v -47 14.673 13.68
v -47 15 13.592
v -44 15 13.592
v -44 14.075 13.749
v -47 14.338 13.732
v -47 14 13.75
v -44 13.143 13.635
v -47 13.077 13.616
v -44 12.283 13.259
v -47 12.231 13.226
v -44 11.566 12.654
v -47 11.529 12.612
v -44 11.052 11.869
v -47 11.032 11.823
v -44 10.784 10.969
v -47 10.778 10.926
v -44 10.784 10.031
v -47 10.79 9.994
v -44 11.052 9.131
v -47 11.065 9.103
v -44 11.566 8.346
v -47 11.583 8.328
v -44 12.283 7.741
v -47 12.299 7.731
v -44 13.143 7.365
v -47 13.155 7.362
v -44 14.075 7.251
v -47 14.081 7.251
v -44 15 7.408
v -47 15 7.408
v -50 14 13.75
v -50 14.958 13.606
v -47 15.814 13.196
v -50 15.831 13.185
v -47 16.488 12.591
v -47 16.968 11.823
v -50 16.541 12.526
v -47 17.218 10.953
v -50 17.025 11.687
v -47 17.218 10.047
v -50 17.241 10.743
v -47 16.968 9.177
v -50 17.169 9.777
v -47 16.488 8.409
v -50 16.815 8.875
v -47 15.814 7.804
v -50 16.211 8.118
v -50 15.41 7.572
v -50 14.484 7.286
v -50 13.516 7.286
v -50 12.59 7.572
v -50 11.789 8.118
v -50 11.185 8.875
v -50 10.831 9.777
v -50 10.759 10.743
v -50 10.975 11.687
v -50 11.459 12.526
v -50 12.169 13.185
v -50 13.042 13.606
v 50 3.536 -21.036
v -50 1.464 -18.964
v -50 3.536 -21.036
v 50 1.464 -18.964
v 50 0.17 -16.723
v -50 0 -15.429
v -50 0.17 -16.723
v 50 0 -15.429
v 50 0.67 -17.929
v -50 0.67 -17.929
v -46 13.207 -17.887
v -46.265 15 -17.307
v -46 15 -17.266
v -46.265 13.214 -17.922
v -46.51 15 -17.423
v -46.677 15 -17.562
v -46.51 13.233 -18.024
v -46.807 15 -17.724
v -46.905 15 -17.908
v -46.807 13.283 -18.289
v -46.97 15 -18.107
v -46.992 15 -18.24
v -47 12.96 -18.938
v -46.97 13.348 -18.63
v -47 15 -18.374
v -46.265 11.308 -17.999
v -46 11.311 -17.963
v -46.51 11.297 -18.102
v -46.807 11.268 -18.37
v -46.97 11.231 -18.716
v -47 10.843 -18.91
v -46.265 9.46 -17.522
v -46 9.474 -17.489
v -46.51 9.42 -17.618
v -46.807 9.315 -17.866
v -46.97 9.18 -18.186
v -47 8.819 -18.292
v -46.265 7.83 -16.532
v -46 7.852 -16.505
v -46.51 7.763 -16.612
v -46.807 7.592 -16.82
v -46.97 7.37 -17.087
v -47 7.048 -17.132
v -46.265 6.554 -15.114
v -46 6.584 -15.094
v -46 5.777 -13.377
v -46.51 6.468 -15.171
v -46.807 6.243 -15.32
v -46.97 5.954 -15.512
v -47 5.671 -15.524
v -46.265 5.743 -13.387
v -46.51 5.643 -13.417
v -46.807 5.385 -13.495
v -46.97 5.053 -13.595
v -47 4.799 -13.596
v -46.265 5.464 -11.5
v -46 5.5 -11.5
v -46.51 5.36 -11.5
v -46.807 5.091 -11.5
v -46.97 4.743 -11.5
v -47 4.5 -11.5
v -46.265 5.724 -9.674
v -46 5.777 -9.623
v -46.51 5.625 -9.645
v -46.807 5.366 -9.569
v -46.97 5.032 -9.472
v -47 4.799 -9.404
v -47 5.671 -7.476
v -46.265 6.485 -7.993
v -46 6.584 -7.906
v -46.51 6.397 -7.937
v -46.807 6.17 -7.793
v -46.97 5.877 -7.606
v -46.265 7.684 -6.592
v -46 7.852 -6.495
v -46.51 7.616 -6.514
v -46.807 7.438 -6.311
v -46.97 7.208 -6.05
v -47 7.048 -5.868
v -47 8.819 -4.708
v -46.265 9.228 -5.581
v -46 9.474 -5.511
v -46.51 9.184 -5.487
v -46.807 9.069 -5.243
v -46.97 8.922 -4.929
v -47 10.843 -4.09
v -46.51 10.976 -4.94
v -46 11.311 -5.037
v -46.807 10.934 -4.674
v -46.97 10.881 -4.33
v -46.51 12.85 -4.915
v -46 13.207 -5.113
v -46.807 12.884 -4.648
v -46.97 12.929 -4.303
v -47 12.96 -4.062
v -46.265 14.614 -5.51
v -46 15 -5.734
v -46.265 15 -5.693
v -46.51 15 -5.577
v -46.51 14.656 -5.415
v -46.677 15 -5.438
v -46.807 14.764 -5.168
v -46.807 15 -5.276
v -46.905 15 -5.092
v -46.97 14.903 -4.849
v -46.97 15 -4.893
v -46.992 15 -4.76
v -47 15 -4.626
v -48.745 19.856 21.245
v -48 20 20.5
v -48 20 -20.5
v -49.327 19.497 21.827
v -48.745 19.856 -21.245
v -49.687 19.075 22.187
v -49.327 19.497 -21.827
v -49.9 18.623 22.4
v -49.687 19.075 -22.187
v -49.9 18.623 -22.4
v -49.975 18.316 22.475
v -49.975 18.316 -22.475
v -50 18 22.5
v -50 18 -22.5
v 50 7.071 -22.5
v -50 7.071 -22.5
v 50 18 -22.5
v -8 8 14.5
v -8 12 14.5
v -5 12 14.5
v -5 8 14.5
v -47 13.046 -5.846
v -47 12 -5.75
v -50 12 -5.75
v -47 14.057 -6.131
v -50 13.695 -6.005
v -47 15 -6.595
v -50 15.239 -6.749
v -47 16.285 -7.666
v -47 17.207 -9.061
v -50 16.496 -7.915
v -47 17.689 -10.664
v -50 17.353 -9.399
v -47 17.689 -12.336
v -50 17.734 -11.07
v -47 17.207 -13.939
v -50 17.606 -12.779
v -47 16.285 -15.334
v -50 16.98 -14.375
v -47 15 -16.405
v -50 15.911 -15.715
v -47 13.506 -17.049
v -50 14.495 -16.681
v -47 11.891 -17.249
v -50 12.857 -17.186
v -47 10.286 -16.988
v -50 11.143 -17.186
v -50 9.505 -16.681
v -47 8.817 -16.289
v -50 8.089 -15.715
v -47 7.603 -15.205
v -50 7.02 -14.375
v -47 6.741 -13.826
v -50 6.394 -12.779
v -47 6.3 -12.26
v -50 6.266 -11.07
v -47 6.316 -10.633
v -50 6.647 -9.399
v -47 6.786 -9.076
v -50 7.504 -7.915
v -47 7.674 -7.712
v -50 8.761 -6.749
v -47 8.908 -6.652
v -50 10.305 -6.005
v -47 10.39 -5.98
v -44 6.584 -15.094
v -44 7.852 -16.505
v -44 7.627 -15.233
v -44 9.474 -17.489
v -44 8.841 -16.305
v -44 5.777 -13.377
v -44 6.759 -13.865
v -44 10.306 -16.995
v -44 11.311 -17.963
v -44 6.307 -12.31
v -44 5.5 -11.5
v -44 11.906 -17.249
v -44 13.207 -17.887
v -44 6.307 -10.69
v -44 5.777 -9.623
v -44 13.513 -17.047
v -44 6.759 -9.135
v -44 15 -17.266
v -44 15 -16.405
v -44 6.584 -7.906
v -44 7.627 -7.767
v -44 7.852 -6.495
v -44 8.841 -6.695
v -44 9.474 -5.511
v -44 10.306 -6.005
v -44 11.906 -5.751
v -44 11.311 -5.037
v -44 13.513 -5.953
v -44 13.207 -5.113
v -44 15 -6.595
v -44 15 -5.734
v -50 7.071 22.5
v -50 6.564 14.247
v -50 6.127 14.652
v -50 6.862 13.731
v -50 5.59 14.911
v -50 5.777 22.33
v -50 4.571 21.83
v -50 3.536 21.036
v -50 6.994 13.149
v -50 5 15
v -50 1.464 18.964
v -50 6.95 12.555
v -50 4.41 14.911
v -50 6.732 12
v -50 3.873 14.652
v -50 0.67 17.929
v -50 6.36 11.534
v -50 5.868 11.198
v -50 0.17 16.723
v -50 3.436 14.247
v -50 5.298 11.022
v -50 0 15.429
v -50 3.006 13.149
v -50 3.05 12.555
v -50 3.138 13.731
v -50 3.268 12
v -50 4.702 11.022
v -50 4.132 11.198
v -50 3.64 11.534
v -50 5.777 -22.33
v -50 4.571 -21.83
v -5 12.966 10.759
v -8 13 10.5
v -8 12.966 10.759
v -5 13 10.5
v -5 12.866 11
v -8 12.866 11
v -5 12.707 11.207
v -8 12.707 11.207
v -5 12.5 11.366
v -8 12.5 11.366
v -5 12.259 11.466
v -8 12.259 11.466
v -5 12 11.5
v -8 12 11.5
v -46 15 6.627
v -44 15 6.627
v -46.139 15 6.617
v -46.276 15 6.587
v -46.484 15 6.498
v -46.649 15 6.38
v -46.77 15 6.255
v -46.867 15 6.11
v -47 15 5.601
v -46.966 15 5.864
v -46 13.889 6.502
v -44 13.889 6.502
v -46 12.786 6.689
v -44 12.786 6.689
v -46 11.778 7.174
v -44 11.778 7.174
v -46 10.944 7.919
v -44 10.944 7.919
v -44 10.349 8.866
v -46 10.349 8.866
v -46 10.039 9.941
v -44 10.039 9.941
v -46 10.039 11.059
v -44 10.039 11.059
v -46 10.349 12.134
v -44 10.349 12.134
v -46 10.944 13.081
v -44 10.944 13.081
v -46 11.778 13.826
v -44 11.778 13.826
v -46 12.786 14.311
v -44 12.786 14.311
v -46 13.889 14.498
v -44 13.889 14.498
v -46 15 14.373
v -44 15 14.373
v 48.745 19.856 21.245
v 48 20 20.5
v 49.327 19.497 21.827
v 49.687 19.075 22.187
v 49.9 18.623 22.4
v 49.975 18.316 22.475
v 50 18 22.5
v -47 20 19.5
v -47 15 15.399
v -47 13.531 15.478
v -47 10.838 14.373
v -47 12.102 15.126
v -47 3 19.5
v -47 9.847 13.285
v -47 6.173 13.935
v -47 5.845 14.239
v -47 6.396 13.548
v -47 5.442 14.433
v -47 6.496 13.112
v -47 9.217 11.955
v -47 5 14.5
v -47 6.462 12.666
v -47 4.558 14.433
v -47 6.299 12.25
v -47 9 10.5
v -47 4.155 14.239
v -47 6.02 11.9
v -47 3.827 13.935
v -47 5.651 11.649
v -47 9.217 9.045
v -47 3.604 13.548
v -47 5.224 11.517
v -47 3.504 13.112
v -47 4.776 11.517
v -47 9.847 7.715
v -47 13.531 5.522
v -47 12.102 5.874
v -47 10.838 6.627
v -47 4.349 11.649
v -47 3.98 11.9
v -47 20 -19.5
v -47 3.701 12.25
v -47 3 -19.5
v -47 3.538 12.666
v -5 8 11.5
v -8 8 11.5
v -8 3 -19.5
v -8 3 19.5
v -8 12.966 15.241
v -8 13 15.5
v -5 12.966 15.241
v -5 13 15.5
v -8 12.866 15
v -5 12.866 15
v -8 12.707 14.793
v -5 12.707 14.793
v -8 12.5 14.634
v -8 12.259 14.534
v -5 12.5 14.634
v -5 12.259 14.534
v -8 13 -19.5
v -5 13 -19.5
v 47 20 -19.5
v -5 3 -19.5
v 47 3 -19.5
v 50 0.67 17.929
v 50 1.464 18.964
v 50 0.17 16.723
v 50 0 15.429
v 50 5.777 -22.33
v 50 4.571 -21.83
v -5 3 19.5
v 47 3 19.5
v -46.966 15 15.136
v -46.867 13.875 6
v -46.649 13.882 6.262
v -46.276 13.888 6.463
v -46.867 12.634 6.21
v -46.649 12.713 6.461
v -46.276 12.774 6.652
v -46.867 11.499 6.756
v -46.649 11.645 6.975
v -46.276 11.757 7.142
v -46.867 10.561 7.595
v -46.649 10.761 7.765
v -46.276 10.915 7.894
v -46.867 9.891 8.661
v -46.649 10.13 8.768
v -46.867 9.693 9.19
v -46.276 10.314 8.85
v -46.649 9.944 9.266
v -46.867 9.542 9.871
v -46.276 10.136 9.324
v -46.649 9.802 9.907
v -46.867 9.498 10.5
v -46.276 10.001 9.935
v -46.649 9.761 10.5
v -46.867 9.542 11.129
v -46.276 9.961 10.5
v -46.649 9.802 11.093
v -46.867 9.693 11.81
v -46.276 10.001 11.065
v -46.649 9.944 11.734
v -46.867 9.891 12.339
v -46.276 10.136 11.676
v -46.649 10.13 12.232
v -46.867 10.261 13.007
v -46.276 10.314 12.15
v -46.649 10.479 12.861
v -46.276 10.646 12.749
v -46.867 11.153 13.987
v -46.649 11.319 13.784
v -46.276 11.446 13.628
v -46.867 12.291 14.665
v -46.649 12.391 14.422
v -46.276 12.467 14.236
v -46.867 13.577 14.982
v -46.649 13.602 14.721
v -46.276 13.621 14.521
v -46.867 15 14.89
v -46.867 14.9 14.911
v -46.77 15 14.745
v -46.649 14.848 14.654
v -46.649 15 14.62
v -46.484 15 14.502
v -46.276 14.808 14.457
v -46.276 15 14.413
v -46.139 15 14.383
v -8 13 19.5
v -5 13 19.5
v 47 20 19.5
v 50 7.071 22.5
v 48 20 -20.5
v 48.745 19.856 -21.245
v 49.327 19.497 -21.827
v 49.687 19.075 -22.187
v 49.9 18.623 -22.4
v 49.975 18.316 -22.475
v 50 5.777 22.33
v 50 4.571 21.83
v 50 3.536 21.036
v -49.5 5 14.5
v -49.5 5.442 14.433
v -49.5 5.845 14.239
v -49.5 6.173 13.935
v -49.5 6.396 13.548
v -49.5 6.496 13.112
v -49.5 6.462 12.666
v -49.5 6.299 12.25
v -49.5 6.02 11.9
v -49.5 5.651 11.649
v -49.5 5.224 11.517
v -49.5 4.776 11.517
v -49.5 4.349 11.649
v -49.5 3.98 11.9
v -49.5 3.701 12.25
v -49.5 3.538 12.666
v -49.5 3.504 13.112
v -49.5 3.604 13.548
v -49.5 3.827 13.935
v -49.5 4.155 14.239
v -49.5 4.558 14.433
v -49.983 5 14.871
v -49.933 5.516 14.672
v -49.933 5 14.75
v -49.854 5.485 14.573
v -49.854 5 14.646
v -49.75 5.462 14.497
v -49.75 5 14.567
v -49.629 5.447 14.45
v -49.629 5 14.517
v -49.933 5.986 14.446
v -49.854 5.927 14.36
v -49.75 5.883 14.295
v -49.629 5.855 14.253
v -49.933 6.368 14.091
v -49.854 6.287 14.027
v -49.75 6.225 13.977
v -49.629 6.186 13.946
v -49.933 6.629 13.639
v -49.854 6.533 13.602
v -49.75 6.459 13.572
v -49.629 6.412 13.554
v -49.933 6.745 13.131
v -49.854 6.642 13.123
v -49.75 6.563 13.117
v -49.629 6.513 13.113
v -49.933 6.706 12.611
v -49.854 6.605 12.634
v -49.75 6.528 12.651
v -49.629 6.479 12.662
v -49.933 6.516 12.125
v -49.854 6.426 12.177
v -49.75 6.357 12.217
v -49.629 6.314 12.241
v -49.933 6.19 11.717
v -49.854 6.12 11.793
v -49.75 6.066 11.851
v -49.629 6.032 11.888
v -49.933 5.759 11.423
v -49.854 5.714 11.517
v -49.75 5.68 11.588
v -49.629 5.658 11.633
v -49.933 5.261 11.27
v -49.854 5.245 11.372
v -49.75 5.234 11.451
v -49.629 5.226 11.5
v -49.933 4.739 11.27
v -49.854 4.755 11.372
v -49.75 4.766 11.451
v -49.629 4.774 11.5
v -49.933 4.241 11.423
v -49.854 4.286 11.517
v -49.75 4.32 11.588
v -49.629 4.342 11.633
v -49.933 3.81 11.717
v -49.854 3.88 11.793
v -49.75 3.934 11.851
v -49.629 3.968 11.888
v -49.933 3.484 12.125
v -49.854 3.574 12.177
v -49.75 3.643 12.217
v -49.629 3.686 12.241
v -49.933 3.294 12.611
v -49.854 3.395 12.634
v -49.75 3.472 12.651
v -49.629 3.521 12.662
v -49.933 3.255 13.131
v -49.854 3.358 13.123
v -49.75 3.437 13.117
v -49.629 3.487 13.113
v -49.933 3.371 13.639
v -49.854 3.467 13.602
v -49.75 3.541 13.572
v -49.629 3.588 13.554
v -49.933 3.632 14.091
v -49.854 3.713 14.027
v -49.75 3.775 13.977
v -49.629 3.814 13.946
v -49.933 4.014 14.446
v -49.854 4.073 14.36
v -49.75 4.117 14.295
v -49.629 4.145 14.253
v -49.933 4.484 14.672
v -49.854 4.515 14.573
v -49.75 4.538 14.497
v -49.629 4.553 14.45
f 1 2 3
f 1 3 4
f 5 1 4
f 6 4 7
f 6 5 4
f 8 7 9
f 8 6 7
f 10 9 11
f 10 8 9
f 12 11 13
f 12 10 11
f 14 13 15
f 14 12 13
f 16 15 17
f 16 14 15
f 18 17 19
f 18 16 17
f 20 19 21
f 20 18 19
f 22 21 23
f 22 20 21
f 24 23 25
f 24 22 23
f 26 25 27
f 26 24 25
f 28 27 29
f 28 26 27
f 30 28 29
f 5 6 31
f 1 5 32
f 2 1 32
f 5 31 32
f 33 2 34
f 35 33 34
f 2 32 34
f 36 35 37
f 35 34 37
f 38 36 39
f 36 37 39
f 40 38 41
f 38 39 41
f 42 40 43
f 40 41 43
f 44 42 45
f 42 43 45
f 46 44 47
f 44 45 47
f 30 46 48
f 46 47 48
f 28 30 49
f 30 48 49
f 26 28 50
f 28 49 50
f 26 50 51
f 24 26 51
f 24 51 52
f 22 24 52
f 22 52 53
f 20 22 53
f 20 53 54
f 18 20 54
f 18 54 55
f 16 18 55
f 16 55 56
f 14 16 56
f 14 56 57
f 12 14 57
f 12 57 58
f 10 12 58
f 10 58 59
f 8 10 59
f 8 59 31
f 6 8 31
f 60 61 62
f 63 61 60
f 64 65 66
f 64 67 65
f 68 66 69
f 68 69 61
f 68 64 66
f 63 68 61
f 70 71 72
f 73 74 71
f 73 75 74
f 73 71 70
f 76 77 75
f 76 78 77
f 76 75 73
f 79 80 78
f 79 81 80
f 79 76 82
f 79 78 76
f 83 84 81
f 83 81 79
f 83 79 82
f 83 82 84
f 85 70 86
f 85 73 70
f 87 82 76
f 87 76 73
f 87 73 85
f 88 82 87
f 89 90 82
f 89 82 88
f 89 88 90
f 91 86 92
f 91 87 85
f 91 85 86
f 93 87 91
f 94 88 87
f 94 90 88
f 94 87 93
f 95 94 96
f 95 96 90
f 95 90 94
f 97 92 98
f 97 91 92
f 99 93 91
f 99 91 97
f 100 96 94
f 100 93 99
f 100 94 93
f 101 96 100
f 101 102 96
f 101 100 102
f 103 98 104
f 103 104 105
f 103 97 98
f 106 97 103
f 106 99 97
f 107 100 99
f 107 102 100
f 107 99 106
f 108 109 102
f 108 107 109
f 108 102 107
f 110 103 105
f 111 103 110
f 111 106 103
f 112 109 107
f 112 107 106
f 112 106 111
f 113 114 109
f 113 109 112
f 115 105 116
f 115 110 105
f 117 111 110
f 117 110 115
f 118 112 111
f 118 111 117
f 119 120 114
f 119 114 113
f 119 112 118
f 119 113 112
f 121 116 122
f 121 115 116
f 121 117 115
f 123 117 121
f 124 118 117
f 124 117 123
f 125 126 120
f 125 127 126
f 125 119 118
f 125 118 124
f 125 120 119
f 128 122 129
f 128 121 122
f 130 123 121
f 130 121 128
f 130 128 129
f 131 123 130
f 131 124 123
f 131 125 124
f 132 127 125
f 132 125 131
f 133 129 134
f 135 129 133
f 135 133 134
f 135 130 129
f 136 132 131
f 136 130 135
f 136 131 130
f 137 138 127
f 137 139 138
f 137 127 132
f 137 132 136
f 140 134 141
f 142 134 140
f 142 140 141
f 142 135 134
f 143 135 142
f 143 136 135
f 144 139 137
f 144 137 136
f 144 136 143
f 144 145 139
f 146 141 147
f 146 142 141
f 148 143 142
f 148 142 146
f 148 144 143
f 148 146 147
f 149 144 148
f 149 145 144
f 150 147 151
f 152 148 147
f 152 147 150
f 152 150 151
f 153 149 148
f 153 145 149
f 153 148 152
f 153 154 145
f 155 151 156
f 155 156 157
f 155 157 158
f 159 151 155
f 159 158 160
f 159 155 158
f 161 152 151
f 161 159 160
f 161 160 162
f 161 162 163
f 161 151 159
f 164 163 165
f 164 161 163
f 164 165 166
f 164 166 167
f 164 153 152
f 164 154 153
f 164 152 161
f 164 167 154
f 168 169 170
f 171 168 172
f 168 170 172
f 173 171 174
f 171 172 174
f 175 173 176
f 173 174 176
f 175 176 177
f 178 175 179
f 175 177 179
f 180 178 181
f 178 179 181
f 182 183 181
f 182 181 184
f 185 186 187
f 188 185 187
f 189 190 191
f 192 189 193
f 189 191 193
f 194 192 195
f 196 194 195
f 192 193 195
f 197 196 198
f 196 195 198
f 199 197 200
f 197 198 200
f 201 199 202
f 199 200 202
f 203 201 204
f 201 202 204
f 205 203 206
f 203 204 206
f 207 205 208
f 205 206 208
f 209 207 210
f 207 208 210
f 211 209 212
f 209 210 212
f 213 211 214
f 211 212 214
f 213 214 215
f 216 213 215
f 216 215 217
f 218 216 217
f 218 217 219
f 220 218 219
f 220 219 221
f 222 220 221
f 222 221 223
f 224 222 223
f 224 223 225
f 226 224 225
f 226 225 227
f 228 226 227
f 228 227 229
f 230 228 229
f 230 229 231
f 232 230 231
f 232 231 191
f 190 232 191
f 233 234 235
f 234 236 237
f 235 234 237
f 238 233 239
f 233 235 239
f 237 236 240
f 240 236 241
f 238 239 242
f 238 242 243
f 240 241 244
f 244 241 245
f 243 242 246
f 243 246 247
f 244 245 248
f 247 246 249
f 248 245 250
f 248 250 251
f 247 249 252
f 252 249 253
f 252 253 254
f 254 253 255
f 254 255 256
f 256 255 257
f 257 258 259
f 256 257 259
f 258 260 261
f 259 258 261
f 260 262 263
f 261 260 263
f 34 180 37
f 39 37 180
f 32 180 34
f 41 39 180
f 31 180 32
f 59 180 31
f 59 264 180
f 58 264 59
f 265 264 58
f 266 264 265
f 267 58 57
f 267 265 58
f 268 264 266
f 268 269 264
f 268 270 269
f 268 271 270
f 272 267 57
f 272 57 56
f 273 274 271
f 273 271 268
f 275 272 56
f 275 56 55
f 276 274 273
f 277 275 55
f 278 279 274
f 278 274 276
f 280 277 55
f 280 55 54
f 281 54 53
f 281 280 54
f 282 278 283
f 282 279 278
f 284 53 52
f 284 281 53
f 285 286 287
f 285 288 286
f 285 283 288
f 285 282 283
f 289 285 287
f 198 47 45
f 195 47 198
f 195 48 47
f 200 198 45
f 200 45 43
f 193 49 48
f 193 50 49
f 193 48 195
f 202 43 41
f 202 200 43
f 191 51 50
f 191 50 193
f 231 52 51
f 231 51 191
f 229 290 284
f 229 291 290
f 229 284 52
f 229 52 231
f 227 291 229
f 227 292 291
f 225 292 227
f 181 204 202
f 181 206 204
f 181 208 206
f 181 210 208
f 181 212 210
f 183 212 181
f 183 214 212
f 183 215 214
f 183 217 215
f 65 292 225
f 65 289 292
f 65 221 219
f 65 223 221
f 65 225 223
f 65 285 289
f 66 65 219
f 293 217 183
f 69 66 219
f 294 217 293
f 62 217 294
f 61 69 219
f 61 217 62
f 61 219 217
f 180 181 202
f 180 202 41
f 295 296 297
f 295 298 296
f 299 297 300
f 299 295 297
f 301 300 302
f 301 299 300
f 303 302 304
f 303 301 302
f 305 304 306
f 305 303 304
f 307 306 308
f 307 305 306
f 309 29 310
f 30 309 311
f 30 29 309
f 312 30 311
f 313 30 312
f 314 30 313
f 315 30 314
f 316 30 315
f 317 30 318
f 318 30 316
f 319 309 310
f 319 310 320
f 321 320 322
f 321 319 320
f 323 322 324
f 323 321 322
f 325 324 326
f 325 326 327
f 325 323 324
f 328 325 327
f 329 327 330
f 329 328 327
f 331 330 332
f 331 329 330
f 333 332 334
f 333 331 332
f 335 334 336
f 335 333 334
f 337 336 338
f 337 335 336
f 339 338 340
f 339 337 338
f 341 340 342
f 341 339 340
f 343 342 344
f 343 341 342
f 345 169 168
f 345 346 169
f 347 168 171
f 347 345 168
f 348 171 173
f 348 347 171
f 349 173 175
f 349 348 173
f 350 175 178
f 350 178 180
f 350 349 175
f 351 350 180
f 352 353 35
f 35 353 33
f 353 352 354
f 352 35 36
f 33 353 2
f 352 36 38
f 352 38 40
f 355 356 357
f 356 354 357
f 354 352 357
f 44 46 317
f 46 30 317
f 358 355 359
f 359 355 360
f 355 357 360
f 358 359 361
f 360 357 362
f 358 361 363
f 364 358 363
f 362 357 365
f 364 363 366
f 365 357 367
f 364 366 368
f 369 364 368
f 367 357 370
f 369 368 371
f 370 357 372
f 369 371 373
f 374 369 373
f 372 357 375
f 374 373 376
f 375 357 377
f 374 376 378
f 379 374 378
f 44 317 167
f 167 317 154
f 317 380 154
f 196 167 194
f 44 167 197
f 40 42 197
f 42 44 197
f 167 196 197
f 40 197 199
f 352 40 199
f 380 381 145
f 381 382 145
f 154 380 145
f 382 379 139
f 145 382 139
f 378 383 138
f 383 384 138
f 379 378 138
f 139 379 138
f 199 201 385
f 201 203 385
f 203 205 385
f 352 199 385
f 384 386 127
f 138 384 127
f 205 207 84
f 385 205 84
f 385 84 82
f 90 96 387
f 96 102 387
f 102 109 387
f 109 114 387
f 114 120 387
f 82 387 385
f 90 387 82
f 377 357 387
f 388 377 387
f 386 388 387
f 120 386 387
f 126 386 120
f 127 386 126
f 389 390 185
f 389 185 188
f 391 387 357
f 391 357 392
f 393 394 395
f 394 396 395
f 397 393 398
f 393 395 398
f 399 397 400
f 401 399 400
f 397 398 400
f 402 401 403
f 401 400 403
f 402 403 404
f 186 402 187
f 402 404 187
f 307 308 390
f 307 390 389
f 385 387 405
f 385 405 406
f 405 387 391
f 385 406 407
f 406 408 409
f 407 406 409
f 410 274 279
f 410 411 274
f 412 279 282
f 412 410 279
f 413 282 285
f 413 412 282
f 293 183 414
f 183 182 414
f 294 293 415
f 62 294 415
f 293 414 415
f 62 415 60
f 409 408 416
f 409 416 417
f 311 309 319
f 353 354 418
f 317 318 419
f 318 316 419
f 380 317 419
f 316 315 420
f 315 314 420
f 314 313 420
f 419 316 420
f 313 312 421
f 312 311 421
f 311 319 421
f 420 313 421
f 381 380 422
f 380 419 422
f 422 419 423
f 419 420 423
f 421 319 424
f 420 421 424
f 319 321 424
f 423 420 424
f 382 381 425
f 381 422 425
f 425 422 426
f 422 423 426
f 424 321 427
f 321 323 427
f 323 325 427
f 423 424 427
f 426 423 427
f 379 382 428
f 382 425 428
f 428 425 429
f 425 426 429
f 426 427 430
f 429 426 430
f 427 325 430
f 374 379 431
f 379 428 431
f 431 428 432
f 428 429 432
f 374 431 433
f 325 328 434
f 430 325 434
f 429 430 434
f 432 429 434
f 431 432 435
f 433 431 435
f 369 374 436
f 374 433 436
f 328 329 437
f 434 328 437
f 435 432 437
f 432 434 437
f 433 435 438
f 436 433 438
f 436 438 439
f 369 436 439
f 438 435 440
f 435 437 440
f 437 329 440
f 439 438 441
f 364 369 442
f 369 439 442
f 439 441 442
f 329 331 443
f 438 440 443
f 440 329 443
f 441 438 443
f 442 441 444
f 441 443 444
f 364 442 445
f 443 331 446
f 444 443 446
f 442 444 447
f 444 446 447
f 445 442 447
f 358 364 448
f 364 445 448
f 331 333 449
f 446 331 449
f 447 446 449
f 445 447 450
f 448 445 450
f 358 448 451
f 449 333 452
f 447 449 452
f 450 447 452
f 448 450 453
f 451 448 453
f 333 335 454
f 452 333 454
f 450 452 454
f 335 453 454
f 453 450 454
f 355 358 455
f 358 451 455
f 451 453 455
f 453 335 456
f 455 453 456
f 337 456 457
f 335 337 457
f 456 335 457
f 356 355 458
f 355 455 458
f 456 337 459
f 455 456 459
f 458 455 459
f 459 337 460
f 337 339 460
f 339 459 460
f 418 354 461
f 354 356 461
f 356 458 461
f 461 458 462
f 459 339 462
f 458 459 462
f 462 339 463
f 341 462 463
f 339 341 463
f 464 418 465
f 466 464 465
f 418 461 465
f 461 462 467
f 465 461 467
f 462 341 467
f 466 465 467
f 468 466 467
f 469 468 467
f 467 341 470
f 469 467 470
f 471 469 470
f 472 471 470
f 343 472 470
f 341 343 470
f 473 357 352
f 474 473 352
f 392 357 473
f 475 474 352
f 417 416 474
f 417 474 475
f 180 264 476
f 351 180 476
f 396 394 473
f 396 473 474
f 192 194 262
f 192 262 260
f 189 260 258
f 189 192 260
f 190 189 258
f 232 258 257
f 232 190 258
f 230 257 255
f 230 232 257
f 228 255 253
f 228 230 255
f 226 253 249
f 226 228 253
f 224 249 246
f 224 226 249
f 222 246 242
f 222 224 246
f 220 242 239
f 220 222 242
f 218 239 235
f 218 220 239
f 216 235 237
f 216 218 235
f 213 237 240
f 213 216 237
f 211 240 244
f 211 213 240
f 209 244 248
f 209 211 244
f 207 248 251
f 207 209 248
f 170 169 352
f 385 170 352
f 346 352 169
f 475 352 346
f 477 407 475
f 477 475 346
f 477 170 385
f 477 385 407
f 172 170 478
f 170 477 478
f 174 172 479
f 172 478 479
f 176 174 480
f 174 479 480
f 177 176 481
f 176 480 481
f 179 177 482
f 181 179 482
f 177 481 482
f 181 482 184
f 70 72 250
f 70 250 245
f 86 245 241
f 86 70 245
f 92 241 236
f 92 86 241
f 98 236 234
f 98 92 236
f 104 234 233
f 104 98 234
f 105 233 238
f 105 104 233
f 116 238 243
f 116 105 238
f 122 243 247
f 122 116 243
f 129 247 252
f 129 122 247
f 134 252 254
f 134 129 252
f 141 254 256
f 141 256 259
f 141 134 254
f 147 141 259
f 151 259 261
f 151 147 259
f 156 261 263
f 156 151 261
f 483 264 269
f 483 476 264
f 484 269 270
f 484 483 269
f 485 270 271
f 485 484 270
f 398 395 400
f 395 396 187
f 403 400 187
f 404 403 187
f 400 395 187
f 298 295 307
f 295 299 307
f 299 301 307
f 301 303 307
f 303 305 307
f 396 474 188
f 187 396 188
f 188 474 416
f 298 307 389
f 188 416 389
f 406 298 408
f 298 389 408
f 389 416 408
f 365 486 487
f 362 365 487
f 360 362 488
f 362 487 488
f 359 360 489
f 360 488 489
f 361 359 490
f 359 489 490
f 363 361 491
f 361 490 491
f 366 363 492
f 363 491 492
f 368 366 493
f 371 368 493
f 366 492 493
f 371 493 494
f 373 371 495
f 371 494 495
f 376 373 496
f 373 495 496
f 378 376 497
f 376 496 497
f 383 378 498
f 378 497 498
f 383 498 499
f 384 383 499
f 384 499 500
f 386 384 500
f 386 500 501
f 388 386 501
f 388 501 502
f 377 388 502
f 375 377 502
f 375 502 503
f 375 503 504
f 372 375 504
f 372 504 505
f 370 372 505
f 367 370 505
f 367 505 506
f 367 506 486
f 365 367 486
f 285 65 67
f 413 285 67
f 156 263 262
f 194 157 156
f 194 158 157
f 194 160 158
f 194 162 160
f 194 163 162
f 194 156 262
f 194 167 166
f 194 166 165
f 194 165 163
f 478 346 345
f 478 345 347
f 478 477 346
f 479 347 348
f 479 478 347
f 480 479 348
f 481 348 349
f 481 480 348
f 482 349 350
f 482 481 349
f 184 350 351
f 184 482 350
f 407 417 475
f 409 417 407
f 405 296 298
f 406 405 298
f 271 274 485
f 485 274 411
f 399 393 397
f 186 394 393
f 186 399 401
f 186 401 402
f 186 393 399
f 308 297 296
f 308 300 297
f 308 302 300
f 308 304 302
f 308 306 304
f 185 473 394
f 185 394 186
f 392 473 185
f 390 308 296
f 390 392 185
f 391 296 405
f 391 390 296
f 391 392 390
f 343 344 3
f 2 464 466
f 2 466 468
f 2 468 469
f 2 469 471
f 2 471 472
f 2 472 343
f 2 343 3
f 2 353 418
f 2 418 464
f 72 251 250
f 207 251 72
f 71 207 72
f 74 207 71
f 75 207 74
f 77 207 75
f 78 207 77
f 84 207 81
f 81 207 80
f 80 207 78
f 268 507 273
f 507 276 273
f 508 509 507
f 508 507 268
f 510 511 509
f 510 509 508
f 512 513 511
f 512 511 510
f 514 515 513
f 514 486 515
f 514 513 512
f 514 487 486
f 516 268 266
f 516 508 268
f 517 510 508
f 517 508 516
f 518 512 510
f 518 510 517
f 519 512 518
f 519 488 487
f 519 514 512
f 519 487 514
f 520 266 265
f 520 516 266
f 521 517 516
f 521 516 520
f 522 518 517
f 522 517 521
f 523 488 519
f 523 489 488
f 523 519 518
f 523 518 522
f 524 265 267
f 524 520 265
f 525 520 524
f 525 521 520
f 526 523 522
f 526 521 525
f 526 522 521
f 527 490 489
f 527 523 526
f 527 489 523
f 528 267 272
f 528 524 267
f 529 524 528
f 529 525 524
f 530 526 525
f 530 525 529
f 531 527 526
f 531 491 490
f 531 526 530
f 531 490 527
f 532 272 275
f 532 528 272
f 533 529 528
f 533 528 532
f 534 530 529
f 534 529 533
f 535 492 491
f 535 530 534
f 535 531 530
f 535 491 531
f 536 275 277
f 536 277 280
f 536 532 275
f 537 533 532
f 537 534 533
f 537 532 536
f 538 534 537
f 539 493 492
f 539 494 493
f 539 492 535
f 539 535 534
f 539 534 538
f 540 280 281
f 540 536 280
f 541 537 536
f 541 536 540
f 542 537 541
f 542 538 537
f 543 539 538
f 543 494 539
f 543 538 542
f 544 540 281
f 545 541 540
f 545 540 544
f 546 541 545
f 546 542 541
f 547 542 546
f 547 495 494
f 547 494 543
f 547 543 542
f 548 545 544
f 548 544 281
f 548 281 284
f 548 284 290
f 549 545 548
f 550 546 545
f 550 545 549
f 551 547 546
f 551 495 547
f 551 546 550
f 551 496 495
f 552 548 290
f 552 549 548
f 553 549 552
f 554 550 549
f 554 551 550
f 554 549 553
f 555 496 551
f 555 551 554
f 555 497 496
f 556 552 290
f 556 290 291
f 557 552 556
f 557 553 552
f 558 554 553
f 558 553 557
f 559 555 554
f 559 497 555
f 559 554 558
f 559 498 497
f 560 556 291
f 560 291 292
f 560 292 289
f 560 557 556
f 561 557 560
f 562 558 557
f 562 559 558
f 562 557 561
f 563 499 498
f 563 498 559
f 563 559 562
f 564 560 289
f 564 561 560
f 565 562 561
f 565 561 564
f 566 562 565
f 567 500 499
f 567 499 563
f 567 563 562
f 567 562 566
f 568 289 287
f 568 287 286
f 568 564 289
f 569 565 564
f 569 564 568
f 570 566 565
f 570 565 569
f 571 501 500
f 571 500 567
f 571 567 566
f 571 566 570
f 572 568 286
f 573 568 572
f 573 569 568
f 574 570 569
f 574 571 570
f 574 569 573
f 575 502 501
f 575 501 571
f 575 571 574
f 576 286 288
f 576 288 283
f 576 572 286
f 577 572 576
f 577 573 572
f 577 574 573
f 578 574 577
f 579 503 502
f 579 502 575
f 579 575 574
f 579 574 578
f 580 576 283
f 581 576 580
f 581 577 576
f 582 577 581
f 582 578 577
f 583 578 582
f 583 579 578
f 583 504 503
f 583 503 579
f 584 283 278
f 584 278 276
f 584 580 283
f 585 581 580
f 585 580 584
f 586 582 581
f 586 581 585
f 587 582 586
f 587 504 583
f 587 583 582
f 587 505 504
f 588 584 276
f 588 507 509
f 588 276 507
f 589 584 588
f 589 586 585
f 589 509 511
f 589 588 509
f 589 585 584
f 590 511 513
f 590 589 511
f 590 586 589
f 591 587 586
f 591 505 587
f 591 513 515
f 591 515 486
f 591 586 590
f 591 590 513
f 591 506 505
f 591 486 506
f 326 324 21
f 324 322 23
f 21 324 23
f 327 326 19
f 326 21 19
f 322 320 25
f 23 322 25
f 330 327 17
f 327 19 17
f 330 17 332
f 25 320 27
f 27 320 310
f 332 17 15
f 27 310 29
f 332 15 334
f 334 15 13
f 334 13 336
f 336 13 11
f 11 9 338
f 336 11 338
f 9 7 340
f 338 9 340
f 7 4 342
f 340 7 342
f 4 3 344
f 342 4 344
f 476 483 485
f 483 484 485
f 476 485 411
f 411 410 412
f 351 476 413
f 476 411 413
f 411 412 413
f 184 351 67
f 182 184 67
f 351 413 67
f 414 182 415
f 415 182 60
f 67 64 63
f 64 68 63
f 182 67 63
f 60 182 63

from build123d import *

# Parameters (mm, degrees)
SKETCH1_W           = 100
SKETCH1_H           = 45
BOSS_EXTRUDE1_DEPTH = 20
SHELL1_T            = -3
CHAMFER1_SIZE       = 5
FILLET1_R           = 5
SKETCH2_R           = 5.75
SKETCH2_R_2         = 3.25
CUT_EXTRUDE1_DEPTH  = 20
SKETCH3_R           = 1.5
CUT_EXTRUDE2_DEPTH  = 10
BOSS_EXTRUDE2_DEPTH = 3
FILLET2_R           = 1
SKETCH5_W           = 3
SKETCH5_H           = 39
BOSS_EXTRUDE3_DEPTH = 10
SKETCH6_W           = 3
SKETCH6_H           = 3
CUT_EXTRUDE3_DEPTH  = 5
FILLET3_R           = 1
FILLET4_R           = 2
FILLET6_R           = 0.5


with BuildPart() as part:
    # Sketch1 → Boss-Extrude1 (new body)
    with BuildSketch(Plane(origin=(0, 0, 0), x_dir=(1, 0, 0), z_dir=(0, 1, 0))):
        Rectangle(SKETCH1_W, SKETCH1_H)
    extrude(amount=BOSS_EXTRUDE1_DEPTH)

    # Shell1
    shell1_openings = [part.faces().sort_by_distance(p)[0] for p in [
        (0, 20, 0),
    ]]
    offset(amount=SHELL1_T, openings=shell1_openings, kind=Kind.INTERSECTION)

    # Chamfer1
    chamfer1_edges = [part.edges().sort_by_distance(p)[0] for p in [
        (0, 0, 22.5),
        (0, 0, -22.5),
    ]]
    chamfer(chamfer1_edges, length=CHAMFER1_SIZE)

    # Fillet1
    fillet1_edges = [part.edges().sort_by_distance(p)[0] for p in [
        (0, 5, -22.5),
        (0, 0, 17.5),
        (0, 0, -17.5),
        (0, 5, 22.5),
    ]]
    fillet(fillet1_edges, radius=FILLET1_R)

    # Sketch2 → Cut-Extrude1 (cut)
    with BuildSketch(Plane.ZY.offset(50)):
        with Locations((-11.5, 12)):
            Circle(SKETCH2_R)
        with Locations((10.5, 14)):
            Circle(SKETCH2_R_2)
    extrude(amount=-CUT_EXTRUDE1_DEPTH, mode=Mode.SUBTRACT)

    # Sketch3 → Cut-Extrude2 (cut)
    with BuildSketch(Plane.ZY.offset(50)):
        with Locations((13, 5)):
            Circle(SKETCH3_R)
    extrude(amount=-CUT_EXTRUDE2_DEPTH, mode=Mode.SUBTRACT)

    # Sketch4 → Boss-Extrude2 (add)
    with BuildSketch(Plane(origin=(-47, 0, 0), x_dir=(0, 0, -1), z_dir=(1, 0, 0))):
        with BuildLine():
            Line((5.733718703, 15), (6.594645782, 15))
            ThreePointArc((6.594645782, 15), (11.5, 6.25), (16.405354218, 15))
            Line((16.405354218, 15), (17.266281297, 15))
            ThreePointArc((17.266281297, 15), (11.5, 5.5), (5.733718703, 15))
        make_face()
        with BuildLine():
            Line((-14.372983346, 15), (-13.592329219, 15))
            ThreePointArc((-13.592329219, 15), (-10.5, 10.75), (-7.407670781, 15))
            Line((-7.407670781, 15), (-6.627016654, 15))
            ThreePointArc((-6.627016654, 15), (-10.5, 10), (-14.372983346, 15))
        make_face()
    extrude(amount=BOSS_EXTRUDE2_DEPTH)

    # Fillet2
    fillet2_edges = [part.edges().sort_by_distance(p)[0] for p in [
        (-47, 5.5, -11.5),
        (-47, 10, 10.5),
    ]]
    fillet(fillet2_edges, radius=FILLET2_R)

    # Sketch5 → Boss-Extrude3 (add)
    with BuildSketch(Plane(origin=(0, 3, 0), x_dir=(1, 0, 0), z_dir=(0, 1, 0))):
        with Locations((-6.5, 0)):
            Rectangle(SKETCH5_W, SKETCH5_H)
    extrude(amount=BOSS_EXTRUDE3_DEPTH)

    # Sketch6 → Cut-Extrude3 (cut)
    with BuildSketch(Plane(origin=(0, 13, 0), x_dir=(1, 0, 0), z_dir=(0, 1, 0))):
        with Locations((-6.5, -13)):
            Rectangle(SKETCH6_W, SKETCH6_H)
    extrude(amount=-CUT_EXTRUDE3_DEPTH, mode=Mode.SUBTRACT)

    # Fillet3
    fillet3_edges = [part.edges().sort_by_distance(p)[0] for p in [
        (-6.5, 13, 14.5),
        (-6.5, 13, 11.5),
    ]]
    fillet(fillet3_edges, radius=FILLET3_R)

    # Fillet4
    fillet4_edges = [part.edges().sort_by_distance(p)[0] for p in [
        (-50, 20, 0),
        (0, 20, 22.5),
        (50, 20, 0),
        (0, 20, -22.5),
    ]]
    fillet(fillet4_edges, radius=FILLET4_R)

    # Fillet6
    fillet6_edges = [part.edges().sort_by_distance(p)[0] for p in [
        (-50, 5, 11.5),
    ]]
    fillet(fillet6_edges, radius=FILLET6_R)


solid = part.part
